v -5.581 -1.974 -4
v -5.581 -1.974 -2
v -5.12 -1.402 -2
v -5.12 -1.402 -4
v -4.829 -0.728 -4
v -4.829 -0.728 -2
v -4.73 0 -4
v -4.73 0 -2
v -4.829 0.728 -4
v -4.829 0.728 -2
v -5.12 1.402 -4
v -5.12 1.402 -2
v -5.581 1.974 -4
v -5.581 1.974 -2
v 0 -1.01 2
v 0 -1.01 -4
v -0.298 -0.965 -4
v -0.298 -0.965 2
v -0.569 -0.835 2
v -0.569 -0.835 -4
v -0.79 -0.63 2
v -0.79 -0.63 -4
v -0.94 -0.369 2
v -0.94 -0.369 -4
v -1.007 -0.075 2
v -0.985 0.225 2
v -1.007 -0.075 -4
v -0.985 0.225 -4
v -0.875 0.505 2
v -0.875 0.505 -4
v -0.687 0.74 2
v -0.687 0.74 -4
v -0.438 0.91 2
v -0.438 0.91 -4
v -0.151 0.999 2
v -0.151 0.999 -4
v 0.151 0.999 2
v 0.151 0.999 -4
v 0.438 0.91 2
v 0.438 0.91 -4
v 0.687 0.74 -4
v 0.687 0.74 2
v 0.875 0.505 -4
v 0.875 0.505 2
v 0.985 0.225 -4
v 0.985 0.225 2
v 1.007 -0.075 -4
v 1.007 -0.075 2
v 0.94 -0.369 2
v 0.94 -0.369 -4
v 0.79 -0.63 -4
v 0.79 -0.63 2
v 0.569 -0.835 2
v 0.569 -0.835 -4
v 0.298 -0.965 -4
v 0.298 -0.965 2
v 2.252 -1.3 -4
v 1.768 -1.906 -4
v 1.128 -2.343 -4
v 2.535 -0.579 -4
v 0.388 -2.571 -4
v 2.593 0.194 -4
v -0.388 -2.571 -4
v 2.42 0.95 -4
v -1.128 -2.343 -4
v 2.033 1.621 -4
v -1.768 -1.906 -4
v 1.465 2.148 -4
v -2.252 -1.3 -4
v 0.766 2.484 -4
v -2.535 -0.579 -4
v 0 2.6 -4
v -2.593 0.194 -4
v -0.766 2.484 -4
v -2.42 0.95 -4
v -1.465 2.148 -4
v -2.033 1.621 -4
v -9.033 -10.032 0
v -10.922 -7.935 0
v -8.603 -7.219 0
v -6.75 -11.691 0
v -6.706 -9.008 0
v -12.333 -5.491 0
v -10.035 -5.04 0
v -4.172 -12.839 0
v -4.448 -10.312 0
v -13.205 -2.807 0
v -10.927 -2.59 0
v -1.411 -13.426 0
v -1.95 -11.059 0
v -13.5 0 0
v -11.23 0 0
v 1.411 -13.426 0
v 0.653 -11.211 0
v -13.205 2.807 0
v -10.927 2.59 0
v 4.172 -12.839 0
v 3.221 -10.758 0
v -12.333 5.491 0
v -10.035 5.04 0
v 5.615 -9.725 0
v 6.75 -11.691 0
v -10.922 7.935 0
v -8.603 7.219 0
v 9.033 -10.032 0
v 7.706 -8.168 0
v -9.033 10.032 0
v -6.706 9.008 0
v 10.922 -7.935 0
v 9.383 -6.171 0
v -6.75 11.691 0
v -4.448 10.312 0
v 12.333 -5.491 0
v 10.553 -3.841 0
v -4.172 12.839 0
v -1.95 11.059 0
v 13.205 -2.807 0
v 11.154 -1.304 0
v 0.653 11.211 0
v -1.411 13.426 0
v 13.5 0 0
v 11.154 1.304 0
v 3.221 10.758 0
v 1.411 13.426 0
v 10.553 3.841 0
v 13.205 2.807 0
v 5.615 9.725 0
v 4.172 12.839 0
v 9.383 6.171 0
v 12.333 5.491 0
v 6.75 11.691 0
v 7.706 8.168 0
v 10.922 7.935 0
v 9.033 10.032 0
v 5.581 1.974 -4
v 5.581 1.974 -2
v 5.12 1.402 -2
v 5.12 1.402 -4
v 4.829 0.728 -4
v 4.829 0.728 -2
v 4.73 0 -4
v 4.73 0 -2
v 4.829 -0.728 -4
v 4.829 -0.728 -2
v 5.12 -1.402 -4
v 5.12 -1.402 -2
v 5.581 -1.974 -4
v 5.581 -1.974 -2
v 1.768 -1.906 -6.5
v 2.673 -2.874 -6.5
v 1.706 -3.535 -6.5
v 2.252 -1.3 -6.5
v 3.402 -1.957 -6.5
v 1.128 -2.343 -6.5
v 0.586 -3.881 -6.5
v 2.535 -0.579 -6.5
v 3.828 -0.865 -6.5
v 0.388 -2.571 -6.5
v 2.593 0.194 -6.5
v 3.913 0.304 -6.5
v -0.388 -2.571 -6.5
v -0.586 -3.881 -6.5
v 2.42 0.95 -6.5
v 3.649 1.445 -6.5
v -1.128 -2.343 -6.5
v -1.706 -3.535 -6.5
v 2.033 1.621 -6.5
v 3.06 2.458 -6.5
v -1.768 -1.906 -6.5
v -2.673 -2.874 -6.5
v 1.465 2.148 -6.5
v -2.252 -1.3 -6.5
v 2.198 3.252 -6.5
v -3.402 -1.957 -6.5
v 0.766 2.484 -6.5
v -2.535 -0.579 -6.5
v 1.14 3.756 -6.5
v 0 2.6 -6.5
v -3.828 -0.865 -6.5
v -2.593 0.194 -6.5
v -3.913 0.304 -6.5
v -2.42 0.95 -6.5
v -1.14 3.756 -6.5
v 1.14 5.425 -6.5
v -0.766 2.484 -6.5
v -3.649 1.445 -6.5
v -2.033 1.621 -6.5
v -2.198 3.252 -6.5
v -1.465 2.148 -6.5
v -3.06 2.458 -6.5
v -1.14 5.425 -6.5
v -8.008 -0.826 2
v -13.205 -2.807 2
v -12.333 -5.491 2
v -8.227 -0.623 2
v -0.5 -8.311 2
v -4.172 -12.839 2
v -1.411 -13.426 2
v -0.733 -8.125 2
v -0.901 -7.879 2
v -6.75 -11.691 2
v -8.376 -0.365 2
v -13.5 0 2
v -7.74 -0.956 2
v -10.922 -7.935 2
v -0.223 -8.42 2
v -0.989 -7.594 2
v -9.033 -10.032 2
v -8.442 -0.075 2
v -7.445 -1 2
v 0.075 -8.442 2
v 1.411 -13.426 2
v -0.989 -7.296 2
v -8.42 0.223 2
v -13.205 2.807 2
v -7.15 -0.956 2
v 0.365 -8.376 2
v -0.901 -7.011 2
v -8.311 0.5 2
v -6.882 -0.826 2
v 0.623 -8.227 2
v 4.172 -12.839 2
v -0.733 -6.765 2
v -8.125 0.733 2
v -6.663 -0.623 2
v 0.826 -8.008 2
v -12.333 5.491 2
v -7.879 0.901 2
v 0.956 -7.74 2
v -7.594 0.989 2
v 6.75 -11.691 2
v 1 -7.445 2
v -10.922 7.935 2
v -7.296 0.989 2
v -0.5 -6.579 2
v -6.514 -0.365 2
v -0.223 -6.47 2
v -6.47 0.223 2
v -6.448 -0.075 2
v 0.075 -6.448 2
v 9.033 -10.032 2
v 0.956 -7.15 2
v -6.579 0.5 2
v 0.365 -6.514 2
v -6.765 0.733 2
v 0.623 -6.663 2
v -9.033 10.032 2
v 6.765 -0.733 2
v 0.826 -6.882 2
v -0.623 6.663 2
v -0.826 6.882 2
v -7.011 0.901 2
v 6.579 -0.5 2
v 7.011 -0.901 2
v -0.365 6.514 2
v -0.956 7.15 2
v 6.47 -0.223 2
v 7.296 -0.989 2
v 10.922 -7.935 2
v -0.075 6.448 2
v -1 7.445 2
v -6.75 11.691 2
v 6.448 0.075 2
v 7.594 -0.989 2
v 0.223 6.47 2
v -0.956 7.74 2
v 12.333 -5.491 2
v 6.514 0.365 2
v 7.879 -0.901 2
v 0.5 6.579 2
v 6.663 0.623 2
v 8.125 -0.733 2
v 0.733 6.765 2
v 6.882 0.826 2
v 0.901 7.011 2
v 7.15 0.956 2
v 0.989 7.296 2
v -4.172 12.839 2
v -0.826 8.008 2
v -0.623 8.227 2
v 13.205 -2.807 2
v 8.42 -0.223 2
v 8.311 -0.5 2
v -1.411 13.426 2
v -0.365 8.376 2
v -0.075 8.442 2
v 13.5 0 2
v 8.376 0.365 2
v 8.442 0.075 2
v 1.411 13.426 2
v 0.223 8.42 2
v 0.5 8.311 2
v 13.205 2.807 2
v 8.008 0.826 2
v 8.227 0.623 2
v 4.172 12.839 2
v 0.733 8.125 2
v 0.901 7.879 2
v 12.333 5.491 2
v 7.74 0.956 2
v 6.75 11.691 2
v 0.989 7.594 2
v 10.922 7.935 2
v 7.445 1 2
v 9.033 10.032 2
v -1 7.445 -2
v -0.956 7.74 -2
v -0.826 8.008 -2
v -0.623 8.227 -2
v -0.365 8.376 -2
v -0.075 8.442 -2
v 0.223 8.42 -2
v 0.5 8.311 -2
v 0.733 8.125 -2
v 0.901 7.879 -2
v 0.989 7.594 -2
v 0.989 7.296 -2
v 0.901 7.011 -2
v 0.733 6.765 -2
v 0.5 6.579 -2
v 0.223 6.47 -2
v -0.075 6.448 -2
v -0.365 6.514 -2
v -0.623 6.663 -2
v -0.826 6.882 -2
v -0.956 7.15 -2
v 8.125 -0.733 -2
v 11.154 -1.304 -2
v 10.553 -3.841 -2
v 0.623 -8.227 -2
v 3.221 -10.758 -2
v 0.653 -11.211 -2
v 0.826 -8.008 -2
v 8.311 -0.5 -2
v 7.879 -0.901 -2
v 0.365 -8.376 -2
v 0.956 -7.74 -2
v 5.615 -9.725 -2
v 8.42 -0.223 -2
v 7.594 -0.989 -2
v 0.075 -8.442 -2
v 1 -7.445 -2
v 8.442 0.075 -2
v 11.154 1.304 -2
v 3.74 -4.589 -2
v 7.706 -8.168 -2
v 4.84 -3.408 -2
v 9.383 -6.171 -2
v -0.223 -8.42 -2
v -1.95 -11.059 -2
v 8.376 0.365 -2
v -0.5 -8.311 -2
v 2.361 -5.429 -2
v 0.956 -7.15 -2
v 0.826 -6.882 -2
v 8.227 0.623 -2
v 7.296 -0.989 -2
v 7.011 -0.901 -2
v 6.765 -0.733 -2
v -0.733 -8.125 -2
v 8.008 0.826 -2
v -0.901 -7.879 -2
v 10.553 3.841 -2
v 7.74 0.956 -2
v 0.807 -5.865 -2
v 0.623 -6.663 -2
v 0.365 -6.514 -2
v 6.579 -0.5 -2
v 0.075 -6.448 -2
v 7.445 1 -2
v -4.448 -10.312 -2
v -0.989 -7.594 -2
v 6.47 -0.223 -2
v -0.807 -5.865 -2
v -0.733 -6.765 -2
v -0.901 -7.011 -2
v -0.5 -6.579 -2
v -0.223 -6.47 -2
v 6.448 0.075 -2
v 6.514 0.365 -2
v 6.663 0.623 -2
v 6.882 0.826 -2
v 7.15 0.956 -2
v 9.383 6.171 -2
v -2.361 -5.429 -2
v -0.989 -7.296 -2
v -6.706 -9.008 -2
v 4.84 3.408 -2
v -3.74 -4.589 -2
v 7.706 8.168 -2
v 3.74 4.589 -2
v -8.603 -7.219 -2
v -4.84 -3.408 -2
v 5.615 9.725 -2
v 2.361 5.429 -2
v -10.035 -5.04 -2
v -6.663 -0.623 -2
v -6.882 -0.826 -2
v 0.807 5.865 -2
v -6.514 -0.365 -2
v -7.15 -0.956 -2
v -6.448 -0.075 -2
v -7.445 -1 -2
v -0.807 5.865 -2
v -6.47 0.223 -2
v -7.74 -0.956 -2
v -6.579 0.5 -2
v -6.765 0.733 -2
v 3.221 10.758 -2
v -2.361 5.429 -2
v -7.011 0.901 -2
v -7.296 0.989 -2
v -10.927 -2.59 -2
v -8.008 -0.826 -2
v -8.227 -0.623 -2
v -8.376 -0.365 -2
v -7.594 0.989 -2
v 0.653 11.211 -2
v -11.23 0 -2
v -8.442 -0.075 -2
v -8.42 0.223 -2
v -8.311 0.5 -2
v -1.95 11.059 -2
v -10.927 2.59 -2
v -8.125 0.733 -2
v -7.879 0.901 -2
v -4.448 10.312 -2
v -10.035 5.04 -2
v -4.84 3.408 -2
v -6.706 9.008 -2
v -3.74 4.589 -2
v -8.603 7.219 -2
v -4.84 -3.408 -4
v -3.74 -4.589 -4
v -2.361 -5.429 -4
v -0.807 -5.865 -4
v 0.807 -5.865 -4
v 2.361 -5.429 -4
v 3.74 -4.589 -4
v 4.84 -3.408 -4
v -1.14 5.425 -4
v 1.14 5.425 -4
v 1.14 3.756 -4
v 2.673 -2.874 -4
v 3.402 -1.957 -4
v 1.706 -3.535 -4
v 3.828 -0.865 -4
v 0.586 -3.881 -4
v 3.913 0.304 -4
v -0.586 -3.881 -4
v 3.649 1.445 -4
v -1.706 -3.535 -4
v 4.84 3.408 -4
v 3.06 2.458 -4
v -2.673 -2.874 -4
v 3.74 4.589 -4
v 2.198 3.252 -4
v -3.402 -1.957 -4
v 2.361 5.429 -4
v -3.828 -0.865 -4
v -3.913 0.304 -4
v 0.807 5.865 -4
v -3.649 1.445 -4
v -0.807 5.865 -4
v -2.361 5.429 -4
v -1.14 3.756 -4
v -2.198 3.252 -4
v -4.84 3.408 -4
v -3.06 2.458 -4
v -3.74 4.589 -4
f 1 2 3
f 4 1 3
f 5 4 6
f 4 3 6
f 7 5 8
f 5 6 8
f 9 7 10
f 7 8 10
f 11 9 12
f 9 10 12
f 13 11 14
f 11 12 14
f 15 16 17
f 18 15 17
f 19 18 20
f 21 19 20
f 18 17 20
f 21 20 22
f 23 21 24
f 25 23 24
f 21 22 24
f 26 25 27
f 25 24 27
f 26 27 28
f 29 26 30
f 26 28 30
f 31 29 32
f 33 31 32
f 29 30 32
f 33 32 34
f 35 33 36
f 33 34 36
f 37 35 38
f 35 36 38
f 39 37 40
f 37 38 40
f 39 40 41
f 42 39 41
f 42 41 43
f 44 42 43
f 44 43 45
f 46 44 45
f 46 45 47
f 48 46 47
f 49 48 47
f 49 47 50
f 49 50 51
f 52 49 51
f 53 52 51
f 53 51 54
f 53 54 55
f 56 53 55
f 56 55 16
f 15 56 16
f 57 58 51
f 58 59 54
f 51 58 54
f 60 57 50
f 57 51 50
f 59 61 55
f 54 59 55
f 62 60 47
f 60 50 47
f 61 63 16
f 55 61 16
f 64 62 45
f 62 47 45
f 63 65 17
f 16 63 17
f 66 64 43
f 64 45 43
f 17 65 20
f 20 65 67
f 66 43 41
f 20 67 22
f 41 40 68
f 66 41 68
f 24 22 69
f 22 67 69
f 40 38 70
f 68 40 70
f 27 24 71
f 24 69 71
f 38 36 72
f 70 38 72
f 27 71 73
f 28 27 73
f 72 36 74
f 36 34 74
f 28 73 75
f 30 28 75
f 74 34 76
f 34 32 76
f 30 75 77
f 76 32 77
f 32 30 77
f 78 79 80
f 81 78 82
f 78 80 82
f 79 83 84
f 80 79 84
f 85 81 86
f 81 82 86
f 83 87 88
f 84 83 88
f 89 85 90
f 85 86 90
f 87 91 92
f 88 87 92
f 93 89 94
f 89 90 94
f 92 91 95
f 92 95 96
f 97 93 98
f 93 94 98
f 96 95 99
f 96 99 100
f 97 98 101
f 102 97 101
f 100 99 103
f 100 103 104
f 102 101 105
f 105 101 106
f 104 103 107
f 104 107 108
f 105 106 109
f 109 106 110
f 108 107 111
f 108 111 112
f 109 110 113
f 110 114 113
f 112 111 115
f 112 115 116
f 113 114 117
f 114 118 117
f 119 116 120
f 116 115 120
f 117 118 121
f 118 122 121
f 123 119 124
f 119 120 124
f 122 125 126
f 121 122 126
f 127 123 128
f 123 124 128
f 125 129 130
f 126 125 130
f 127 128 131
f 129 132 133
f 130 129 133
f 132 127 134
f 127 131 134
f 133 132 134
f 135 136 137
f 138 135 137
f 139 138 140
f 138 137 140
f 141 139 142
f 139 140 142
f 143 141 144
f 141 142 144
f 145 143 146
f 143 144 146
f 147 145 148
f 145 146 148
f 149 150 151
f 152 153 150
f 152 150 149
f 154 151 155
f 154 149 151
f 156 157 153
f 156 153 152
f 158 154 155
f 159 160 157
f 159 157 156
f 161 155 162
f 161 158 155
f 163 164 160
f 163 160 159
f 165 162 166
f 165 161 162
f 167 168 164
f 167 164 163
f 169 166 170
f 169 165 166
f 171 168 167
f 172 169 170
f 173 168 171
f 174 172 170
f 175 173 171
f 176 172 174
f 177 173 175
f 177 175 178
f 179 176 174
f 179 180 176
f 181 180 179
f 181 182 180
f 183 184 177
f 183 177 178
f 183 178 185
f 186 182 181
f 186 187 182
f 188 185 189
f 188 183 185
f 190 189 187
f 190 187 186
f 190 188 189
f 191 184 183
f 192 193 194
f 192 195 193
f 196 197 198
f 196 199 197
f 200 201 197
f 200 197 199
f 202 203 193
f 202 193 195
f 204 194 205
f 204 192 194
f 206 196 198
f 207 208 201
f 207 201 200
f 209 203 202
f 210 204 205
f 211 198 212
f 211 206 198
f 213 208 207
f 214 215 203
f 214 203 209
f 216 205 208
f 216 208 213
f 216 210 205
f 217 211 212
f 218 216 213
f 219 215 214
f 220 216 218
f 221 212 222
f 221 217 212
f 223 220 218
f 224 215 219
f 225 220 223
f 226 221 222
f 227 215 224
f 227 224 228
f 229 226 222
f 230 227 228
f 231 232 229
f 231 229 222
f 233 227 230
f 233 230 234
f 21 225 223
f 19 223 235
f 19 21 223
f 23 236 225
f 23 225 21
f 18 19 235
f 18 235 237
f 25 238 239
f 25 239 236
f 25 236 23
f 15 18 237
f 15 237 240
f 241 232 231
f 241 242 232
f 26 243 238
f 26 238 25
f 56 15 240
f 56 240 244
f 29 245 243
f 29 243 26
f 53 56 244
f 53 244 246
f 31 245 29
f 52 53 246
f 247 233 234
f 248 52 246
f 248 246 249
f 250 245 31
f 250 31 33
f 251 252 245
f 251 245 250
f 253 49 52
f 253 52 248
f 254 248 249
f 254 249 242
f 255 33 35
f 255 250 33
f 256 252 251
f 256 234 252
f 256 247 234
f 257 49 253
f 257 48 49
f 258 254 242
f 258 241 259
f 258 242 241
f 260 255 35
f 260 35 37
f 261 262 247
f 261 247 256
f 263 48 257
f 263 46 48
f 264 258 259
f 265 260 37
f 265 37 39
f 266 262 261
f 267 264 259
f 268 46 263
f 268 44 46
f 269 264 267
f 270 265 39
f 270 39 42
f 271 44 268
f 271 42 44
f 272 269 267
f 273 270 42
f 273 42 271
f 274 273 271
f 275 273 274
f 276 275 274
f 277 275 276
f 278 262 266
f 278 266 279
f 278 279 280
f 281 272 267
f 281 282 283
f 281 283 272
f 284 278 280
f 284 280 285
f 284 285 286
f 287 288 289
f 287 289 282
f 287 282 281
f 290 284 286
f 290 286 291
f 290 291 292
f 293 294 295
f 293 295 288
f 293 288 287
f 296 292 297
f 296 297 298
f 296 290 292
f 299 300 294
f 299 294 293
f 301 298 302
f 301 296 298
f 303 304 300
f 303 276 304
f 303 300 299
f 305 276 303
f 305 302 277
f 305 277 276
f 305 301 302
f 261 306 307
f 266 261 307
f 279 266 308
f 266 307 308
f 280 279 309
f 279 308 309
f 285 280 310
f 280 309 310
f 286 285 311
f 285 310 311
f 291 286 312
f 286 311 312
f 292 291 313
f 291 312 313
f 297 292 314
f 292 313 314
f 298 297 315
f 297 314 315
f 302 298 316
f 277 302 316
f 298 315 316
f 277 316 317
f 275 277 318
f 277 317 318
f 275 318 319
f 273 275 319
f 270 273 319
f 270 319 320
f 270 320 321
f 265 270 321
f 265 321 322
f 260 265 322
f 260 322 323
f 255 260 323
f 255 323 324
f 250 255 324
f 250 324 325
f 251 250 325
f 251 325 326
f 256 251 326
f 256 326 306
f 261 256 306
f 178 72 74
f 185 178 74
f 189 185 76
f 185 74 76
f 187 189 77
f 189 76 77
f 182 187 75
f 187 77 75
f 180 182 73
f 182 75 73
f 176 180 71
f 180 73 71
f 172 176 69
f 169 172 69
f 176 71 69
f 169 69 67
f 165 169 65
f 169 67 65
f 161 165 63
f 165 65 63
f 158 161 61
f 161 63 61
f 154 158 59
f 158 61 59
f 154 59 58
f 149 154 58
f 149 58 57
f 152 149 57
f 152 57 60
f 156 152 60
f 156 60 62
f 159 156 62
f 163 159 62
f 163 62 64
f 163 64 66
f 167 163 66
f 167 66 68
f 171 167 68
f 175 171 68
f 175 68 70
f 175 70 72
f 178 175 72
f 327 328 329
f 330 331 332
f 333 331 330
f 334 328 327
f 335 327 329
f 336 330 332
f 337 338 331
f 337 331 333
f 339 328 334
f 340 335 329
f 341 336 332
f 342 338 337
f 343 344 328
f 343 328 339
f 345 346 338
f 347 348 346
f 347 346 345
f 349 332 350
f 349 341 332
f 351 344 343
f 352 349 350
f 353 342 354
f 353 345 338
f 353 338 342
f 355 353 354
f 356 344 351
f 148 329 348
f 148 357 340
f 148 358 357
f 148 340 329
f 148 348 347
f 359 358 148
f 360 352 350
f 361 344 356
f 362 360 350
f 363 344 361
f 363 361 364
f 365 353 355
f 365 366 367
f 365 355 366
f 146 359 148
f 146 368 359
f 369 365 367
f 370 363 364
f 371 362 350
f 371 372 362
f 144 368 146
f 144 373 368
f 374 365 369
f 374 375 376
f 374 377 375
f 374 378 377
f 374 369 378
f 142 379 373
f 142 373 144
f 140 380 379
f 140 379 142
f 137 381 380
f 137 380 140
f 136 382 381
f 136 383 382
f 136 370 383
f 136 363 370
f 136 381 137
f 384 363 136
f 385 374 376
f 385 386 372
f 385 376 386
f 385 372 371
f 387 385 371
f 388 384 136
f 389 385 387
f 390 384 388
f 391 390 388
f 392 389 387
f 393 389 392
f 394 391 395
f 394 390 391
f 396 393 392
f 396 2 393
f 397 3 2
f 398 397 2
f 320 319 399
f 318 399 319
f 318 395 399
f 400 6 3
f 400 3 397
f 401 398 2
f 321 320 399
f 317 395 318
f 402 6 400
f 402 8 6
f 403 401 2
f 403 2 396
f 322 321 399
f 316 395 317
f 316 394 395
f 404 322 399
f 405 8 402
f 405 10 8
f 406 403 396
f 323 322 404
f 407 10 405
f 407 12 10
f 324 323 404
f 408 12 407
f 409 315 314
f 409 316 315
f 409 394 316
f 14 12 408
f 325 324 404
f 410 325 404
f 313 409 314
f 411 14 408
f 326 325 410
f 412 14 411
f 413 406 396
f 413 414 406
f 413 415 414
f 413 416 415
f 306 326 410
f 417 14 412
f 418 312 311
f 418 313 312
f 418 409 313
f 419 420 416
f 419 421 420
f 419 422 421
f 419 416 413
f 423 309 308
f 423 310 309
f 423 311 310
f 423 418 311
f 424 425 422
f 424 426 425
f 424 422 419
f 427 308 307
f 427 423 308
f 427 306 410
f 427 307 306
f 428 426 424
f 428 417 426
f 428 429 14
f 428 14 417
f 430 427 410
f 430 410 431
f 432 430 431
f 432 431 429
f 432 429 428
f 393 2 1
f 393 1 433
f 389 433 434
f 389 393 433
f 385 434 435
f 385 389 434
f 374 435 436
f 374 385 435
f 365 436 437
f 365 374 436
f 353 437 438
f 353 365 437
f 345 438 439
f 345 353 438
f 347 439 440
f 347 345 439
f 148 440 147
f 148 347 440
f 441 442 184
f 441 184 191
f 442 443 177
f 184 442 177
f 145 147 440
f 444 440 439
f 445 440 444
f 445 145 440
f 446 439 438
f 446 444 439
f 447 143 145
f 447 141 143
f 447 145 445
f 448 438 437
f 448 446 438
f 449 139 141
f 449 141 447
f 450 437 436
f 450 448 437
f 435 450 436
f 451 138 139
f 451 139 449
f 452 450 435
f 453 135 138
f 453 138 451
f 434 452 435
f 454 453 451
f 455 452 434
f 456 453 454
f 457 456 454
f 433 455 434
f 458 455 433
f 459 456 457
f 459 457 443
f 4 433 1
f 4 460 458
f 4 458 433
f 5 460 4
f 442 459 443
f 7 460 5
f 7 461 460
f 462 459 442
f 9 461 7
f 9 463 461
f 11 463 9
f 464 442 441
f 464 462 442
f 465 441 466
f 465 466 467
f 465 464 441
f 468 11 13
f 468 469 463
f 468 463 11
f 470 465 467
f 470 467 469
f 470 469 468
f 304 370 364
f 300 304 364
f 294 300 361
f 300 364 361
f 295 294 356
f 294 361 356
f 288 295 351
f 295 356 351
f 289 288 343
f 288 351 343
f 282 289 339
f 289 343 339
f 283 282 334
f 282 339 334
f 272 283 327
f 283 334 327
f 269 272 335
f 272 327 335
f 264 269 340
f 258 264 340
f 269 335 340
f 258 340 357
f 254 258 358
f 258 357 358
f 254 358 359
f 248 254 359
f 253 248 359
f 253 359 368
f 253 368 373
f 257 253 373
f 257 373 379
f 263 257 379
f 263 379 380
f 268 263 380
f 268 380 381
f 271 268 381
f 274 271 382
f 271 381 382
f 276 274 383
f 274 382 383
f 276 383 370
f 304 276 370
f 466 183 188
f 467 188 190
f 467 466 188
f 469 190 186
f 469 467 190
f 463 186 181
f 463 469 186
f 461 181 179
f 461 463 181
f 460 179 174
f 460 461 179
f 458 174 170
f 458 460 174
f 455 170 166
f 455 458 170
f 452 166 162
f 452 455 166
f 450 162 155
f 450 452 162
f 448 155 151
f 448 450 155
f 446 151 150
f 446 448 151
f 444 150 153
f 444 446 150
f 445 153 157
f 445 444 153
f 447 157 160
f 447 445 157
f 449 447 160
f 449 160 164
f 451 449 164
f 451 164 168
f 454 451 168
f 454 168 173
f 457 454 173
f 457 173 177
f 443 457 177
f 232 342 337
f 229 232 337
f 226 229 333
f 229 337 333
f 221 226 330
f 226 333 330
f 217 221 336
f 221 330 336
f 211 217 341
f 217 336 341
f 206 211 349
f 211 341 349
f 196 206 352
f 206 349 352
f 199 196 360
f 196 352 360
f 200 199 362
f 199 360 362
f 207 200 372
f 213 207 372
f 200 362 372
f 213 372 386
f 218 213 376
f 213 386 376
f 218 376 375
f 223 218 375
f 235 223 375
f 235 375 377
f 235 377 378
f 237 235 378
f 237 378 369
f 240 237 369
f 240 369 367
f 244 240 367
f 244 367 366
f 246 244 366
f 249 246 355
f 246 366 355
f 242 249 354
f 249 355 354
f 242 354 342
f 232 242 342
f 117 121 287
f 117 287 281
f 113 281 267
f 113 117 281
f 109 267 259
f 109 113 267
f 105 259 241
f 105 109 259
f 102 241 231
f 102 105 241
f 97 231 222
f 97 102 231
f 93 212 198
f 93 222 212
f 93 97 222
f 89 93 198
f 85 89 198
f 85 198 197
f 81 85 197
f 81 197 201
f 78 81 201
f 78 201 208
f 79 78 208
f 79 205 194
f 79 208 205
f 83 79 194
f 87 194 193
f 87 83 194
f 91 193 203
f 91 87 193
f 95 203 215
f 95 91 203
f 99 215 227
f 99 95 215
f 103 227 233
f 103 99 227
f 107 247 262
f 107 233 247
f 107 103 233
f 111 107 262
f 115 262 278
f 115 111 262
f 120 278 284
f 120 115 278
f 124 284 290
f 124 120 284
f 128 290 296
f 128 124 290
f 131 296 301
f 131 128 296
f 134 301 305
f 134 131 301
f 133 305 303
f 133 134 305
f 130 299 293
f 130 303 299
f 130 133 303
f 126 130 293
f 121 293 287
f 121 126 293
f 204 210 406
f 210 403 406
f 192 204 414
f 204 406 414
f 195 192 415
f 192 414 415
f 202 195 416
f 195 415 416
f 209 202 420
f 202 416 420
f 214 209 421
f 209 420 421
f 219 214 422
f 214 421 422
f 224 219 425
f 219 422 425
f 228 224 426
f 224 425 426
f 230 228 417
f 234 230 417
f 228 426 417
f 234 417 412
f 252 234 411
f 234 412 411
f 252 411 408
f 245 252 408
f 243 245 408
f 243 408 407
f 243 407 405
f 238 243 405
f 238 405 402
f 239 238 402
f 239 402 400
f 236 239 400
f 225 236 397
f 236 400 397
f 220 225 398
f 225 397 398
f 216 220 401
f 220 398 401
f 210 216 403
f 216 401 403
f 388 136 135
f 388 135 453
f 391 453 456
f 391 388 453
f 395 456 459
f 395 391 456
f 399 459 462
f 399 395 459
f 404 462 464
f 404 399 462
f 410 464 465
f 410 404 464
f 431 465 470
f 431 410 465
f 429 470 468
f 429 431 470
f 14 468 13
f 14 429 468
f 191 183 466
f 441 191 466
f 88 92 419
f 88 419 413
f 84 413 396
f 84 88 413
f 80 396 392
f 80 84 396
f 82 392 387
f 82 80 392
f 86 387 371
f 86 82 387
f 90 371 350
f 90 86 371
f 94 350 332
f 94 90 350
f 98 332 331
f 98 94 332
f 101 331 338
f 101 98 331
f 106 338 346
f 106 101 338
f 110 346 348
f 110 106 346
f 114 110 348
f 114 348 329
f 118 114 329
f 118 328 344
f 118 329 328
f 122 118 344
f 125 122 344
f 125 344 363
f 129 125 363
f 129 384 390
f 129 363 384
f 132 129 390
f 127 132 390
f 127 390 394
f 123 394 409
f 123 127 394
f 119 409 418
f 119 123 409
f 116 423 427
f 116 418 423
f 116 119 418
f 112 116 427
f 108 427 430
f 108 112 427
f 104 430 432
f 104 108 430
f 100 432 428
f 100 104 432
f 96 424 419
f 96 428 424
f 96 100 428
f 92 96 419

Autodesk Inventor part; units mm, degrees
ref_plane "YZ Plane" through (0, 0, 0) normal (1, 0, 0) x (0, 1, 0)
ref_plane "XY Plane" through (0, 0, 0) normal (0, 0, 1) x (1, 0, 0)
sketch "Boceto1" plane through (0, 0, 0) normal (0, 0, 1) x (1, 0, 0)
  circle A0 centre (0, 0) radius 13.5
  dimension "d0" = 27
extrude "Extrusión1" add sketch "Boceto1" along normal blind 2
sketch "Boceto2" plane through (0, 0, 0) normal (0, 0, -1) x (-1, 0, 0)
  circle A0 centre (0, 0) radius 13.5 projected
  circle A1 centre (0, 0) radius 11.23
  dimension "d3" = 22.46
extrude "Extrusión2" add sketch "Boceto2" along normal blind 2 contours A1
sketch "Boceto3" plane through (0, 0, -2) normal (0, 0, -1) x (-1, 0, 0)
  circle A0 centre (0, 0) radius 11.23 projected
  circle A1 centre (0, 0) radius 5.92
  dimension "d6" = 11.84
extrude "Extrusión3" add sketch "Boceto3" along normal blind 2 contours A1
sketch "Boceto4" plane through (0, 0, -4) normal (0, 0, -1) x (-1, 0, 0)
  circle A0 centre (0, 0) radius 5.92 projected
  circle A1 centre (0, 0) radius 3.925
  dimension "d9" = 7.85
extrude "Extrusión4" add sketch "Boceto4" along normal blind 2.5 contours A1
hole "Hole1" at (0, 0, 2) direction (0, 0, -1) diameter 2.02 end through all
hole "Hole2" at (0, 0, -6.5) direction (0, 0, 1) diameter 5.2 depth 2.5
ref_plane "Plano de trabajo1" through (0, 3.925, -4) normal (0, 1, 0) x (-1, 0, 0)
sketch "Boceto11" plane through (0, 3.925, -4) normal (0, 1, 0) x (-1, 0, 0)
  line L0 (0, 9) -> (0, -15.4341)
  line L1 (1.14, 0) -> (-1.14, 0)
  line L2 (-1.14, 0) -> (-1.14, -2.5)
  line L3 (-1.14, -2.5) -> (1.14, -2.5)
  line L4 (1.14, -2.5) -> (1.14, 0)
  dimension "d44" = 2.28
  dimension "d45" = 2.5
  dimension "d46" = 1.14
extrude "Extrusión6" add sketch "Boceto11" along normal blind 1.5 and the other way blind 1
sketch "Boceto13" plane through (0, 0, -2) normal (0, 0, -1) x (-1, 0, 0)
  circle A0 centre (0, 7.4449) radius 1
extrude "Extrusión7" cut sketch "Boceto13" against normal blind 6.5
pattern_circular "Patrón circular2" count 4 over 360 about axis through (0, 0, -10) along (0, 0, 1) of "Extrusión7"
hole "Hole6" at (-7.4449, 0, -4) direction (0, 0, 1) diameter 5.43 depth 2
mirror "Simetría2" about plane through (0, 0, 0) normal (1, 0, 0) of "Hole6"
properties part number "TapaPosterior"
